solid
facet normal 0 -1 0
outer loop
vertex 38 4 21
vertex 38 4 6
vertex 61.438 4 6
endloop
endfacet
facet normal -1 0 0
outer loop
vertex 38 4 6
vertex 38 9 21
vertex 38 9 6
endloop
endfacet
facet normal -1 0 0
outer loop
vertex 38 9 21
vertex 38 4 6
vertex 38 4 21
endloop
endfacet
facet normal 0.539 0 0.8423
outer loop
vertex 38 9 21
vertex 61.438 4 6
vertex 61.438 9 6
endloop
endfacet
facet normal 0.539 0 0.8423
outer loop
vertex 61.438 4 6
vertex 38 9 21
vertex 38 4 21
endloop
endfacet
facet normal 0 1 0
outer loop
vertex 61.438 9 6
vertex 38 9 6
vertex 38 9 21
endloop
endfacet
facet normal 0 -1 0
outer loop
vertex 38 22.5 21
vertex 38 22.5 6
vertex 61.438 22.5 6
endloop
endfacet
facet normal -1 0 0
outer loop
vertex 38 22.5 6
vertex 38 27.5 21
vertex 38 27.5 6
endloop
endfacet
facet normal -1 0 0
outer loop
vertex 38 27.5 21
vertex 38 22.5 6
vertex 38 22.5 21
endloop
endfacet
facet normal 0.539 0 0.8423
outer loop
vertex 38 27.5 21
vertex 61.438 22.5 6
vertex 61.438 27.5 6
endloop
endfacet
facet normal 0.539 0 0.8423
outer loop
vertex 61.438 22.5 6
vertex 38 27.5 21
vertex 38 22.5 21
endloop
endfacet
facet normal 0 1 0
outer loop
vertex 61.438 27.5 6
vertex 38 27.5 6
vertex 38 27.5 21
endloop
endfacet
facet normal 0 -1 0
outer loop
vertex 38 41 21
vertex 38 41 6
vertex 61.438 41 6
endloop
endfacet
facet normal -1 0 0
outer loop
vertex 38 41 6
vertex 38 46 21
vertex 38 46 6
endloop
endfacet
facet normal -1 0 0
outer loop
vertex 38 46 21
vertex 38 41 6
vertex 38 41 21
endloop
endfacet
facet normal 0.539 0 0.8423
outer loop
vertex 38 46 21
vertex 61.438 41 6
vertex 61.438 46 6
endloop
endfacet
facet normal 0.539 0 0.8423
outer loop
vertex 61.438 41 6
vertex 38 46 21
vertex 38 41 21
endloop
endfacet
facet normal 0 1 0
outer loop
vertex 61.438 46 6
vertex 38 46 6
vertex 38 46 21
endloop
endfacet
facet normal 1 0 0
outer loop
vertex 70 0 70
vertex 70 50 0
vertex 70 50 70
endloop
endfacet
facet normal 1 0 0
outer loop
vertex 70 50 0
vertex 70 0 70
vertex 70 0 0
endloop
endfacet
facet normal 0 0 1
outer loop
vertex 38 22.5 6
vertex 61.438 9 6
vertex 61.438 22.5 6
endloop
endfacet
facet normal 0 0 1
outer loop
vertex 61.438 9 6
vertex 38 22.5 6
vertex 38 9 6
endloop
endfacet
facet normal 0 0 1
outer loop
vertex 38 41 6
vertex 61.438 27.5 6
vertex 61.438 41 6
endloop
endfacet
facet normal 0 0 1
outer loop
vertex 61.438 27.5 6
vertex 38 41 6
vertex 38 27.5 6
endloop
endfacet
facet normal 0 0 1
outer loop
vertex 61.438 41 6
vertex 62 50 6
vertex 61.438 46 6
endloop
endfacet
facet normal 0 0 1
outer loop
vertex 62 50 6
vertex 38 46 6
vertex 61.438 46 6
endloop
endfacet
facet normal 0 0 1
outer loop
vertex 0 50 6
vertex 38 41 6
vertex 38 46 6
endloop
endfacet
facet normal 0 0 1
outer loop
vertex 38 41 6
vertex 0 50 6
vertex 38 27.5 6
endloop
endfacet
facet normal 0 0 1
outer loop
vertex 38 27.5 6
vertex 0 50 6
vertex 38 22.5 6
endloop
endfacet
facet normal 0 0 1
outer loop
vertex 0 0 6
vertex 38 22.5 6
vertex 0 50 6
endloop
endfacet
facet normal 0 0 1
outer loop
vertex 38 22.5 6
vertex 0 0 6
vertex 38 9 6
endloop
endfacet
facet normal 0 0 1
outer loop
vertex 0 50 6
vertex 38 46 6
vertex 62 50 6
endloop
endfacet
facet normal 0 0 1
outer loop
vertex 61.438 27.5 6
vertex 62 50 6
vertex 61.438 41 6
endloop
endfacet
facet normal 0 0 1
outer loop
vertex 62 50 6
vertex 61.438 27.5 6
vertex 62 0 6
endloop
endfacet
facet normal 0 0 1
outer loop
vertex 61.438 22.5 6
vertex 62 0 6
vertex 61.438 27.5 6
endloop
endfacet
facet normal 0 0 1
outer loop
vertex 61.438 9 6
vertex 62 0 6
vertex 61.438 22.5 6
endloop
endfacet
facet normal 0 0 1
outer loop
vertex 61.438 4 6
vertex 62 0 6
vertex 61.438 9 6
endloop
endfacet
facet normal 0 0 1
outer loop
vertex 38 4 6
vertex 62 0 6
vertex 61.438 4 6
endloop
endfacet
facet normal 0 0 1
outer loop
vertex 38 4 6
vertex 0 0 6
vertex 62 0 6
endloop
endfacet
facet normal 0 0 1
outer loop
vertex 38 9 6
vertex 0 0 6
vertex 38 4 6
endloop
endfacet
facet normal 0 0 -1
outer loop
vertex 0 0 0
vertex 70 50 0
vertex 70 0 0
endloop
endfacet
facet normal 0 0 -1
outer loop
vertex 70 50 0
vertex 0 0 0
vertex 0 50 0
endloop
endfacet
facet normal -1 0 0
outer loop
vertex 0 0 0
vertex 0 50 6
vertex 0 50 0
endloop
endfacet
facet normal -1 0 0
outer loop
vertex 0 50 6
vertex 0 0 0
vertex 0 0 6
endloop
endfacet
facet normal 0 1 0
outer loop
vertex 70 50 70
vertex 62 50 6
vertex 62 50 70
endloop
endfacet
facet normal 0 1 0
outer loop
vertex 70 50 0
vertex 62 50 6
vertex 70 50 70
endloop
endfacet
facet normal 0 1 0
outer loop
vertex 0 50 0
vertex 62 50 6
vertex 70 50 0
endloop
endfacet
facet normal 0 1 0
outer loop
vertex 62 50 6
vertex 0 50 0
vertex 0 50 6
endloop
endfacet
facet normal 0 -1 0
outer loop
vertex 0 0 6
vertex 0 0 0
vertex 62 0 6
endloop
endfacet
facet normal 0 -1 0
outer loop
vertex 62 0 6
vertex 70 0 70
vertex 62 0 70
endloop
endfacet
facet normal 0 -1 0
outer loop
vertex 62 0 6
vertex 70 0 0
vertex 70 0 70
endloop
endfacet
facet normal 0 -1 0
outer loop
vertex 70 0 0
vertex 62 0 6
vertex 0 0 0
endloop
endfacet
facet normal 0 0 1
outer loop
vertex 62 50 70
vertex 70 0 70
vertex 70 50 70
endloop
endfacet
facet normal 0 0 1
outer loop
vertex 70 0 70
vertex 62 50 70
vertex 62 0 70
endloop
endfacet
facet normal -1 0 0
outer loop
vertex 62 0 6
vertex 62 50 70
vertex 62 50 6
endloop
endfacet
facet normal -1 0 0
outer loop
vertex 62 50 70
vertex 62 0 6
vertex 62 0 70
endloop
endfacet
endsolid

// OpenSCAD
$fn = 32;

// ----------------------------------------------------------------------
// Rib bracket: 3-gusset L bracket
// ----------------------------------------------------------------------

// --- parameters (mm) ---
base_l = 70;              // foot length, X
base_w = 50;              // foot width, Y
base_t = 6;               // foot thickness
plate_t = 8;              // upright plate thickness
plate_h = 70;             // overall height
gus_l = 24;               // gusset leg along the foot
gus_h = 16;               // gusset height
gus_t = 5;                // gusset thickness
gus_edge = 4;             // gusset margin from the foot edge
n_gus = 3;                // gusset count
fit_tol = 0.1;            // tolerance for press fits, mm
free_tol = 0.5;           // tolerance for clearance fits, mm

gus_pitch = (base_w - 2 * gus_edge - gus_t) / (n_gus - 1);  // gusset pitch

union() {
  cube([base_l, base_w, base_t]);
  translate([base_l - plate_t, 0, base_t - 1])
    cube([plate_t, base_w, plate_h - base_t + 1]);
  for (i = [0 : n_gus - 1])
    translate([base_l - plate_t - gus_l, gus_edge + i * gus_pitch, base_t - 1])
      rotate([-90, 0, 0])
        linear_extrude(height = gus_t)
          polygon(points = [[0, 0], [gus_l + 1, 0], [0, -gus_h]]);
}
